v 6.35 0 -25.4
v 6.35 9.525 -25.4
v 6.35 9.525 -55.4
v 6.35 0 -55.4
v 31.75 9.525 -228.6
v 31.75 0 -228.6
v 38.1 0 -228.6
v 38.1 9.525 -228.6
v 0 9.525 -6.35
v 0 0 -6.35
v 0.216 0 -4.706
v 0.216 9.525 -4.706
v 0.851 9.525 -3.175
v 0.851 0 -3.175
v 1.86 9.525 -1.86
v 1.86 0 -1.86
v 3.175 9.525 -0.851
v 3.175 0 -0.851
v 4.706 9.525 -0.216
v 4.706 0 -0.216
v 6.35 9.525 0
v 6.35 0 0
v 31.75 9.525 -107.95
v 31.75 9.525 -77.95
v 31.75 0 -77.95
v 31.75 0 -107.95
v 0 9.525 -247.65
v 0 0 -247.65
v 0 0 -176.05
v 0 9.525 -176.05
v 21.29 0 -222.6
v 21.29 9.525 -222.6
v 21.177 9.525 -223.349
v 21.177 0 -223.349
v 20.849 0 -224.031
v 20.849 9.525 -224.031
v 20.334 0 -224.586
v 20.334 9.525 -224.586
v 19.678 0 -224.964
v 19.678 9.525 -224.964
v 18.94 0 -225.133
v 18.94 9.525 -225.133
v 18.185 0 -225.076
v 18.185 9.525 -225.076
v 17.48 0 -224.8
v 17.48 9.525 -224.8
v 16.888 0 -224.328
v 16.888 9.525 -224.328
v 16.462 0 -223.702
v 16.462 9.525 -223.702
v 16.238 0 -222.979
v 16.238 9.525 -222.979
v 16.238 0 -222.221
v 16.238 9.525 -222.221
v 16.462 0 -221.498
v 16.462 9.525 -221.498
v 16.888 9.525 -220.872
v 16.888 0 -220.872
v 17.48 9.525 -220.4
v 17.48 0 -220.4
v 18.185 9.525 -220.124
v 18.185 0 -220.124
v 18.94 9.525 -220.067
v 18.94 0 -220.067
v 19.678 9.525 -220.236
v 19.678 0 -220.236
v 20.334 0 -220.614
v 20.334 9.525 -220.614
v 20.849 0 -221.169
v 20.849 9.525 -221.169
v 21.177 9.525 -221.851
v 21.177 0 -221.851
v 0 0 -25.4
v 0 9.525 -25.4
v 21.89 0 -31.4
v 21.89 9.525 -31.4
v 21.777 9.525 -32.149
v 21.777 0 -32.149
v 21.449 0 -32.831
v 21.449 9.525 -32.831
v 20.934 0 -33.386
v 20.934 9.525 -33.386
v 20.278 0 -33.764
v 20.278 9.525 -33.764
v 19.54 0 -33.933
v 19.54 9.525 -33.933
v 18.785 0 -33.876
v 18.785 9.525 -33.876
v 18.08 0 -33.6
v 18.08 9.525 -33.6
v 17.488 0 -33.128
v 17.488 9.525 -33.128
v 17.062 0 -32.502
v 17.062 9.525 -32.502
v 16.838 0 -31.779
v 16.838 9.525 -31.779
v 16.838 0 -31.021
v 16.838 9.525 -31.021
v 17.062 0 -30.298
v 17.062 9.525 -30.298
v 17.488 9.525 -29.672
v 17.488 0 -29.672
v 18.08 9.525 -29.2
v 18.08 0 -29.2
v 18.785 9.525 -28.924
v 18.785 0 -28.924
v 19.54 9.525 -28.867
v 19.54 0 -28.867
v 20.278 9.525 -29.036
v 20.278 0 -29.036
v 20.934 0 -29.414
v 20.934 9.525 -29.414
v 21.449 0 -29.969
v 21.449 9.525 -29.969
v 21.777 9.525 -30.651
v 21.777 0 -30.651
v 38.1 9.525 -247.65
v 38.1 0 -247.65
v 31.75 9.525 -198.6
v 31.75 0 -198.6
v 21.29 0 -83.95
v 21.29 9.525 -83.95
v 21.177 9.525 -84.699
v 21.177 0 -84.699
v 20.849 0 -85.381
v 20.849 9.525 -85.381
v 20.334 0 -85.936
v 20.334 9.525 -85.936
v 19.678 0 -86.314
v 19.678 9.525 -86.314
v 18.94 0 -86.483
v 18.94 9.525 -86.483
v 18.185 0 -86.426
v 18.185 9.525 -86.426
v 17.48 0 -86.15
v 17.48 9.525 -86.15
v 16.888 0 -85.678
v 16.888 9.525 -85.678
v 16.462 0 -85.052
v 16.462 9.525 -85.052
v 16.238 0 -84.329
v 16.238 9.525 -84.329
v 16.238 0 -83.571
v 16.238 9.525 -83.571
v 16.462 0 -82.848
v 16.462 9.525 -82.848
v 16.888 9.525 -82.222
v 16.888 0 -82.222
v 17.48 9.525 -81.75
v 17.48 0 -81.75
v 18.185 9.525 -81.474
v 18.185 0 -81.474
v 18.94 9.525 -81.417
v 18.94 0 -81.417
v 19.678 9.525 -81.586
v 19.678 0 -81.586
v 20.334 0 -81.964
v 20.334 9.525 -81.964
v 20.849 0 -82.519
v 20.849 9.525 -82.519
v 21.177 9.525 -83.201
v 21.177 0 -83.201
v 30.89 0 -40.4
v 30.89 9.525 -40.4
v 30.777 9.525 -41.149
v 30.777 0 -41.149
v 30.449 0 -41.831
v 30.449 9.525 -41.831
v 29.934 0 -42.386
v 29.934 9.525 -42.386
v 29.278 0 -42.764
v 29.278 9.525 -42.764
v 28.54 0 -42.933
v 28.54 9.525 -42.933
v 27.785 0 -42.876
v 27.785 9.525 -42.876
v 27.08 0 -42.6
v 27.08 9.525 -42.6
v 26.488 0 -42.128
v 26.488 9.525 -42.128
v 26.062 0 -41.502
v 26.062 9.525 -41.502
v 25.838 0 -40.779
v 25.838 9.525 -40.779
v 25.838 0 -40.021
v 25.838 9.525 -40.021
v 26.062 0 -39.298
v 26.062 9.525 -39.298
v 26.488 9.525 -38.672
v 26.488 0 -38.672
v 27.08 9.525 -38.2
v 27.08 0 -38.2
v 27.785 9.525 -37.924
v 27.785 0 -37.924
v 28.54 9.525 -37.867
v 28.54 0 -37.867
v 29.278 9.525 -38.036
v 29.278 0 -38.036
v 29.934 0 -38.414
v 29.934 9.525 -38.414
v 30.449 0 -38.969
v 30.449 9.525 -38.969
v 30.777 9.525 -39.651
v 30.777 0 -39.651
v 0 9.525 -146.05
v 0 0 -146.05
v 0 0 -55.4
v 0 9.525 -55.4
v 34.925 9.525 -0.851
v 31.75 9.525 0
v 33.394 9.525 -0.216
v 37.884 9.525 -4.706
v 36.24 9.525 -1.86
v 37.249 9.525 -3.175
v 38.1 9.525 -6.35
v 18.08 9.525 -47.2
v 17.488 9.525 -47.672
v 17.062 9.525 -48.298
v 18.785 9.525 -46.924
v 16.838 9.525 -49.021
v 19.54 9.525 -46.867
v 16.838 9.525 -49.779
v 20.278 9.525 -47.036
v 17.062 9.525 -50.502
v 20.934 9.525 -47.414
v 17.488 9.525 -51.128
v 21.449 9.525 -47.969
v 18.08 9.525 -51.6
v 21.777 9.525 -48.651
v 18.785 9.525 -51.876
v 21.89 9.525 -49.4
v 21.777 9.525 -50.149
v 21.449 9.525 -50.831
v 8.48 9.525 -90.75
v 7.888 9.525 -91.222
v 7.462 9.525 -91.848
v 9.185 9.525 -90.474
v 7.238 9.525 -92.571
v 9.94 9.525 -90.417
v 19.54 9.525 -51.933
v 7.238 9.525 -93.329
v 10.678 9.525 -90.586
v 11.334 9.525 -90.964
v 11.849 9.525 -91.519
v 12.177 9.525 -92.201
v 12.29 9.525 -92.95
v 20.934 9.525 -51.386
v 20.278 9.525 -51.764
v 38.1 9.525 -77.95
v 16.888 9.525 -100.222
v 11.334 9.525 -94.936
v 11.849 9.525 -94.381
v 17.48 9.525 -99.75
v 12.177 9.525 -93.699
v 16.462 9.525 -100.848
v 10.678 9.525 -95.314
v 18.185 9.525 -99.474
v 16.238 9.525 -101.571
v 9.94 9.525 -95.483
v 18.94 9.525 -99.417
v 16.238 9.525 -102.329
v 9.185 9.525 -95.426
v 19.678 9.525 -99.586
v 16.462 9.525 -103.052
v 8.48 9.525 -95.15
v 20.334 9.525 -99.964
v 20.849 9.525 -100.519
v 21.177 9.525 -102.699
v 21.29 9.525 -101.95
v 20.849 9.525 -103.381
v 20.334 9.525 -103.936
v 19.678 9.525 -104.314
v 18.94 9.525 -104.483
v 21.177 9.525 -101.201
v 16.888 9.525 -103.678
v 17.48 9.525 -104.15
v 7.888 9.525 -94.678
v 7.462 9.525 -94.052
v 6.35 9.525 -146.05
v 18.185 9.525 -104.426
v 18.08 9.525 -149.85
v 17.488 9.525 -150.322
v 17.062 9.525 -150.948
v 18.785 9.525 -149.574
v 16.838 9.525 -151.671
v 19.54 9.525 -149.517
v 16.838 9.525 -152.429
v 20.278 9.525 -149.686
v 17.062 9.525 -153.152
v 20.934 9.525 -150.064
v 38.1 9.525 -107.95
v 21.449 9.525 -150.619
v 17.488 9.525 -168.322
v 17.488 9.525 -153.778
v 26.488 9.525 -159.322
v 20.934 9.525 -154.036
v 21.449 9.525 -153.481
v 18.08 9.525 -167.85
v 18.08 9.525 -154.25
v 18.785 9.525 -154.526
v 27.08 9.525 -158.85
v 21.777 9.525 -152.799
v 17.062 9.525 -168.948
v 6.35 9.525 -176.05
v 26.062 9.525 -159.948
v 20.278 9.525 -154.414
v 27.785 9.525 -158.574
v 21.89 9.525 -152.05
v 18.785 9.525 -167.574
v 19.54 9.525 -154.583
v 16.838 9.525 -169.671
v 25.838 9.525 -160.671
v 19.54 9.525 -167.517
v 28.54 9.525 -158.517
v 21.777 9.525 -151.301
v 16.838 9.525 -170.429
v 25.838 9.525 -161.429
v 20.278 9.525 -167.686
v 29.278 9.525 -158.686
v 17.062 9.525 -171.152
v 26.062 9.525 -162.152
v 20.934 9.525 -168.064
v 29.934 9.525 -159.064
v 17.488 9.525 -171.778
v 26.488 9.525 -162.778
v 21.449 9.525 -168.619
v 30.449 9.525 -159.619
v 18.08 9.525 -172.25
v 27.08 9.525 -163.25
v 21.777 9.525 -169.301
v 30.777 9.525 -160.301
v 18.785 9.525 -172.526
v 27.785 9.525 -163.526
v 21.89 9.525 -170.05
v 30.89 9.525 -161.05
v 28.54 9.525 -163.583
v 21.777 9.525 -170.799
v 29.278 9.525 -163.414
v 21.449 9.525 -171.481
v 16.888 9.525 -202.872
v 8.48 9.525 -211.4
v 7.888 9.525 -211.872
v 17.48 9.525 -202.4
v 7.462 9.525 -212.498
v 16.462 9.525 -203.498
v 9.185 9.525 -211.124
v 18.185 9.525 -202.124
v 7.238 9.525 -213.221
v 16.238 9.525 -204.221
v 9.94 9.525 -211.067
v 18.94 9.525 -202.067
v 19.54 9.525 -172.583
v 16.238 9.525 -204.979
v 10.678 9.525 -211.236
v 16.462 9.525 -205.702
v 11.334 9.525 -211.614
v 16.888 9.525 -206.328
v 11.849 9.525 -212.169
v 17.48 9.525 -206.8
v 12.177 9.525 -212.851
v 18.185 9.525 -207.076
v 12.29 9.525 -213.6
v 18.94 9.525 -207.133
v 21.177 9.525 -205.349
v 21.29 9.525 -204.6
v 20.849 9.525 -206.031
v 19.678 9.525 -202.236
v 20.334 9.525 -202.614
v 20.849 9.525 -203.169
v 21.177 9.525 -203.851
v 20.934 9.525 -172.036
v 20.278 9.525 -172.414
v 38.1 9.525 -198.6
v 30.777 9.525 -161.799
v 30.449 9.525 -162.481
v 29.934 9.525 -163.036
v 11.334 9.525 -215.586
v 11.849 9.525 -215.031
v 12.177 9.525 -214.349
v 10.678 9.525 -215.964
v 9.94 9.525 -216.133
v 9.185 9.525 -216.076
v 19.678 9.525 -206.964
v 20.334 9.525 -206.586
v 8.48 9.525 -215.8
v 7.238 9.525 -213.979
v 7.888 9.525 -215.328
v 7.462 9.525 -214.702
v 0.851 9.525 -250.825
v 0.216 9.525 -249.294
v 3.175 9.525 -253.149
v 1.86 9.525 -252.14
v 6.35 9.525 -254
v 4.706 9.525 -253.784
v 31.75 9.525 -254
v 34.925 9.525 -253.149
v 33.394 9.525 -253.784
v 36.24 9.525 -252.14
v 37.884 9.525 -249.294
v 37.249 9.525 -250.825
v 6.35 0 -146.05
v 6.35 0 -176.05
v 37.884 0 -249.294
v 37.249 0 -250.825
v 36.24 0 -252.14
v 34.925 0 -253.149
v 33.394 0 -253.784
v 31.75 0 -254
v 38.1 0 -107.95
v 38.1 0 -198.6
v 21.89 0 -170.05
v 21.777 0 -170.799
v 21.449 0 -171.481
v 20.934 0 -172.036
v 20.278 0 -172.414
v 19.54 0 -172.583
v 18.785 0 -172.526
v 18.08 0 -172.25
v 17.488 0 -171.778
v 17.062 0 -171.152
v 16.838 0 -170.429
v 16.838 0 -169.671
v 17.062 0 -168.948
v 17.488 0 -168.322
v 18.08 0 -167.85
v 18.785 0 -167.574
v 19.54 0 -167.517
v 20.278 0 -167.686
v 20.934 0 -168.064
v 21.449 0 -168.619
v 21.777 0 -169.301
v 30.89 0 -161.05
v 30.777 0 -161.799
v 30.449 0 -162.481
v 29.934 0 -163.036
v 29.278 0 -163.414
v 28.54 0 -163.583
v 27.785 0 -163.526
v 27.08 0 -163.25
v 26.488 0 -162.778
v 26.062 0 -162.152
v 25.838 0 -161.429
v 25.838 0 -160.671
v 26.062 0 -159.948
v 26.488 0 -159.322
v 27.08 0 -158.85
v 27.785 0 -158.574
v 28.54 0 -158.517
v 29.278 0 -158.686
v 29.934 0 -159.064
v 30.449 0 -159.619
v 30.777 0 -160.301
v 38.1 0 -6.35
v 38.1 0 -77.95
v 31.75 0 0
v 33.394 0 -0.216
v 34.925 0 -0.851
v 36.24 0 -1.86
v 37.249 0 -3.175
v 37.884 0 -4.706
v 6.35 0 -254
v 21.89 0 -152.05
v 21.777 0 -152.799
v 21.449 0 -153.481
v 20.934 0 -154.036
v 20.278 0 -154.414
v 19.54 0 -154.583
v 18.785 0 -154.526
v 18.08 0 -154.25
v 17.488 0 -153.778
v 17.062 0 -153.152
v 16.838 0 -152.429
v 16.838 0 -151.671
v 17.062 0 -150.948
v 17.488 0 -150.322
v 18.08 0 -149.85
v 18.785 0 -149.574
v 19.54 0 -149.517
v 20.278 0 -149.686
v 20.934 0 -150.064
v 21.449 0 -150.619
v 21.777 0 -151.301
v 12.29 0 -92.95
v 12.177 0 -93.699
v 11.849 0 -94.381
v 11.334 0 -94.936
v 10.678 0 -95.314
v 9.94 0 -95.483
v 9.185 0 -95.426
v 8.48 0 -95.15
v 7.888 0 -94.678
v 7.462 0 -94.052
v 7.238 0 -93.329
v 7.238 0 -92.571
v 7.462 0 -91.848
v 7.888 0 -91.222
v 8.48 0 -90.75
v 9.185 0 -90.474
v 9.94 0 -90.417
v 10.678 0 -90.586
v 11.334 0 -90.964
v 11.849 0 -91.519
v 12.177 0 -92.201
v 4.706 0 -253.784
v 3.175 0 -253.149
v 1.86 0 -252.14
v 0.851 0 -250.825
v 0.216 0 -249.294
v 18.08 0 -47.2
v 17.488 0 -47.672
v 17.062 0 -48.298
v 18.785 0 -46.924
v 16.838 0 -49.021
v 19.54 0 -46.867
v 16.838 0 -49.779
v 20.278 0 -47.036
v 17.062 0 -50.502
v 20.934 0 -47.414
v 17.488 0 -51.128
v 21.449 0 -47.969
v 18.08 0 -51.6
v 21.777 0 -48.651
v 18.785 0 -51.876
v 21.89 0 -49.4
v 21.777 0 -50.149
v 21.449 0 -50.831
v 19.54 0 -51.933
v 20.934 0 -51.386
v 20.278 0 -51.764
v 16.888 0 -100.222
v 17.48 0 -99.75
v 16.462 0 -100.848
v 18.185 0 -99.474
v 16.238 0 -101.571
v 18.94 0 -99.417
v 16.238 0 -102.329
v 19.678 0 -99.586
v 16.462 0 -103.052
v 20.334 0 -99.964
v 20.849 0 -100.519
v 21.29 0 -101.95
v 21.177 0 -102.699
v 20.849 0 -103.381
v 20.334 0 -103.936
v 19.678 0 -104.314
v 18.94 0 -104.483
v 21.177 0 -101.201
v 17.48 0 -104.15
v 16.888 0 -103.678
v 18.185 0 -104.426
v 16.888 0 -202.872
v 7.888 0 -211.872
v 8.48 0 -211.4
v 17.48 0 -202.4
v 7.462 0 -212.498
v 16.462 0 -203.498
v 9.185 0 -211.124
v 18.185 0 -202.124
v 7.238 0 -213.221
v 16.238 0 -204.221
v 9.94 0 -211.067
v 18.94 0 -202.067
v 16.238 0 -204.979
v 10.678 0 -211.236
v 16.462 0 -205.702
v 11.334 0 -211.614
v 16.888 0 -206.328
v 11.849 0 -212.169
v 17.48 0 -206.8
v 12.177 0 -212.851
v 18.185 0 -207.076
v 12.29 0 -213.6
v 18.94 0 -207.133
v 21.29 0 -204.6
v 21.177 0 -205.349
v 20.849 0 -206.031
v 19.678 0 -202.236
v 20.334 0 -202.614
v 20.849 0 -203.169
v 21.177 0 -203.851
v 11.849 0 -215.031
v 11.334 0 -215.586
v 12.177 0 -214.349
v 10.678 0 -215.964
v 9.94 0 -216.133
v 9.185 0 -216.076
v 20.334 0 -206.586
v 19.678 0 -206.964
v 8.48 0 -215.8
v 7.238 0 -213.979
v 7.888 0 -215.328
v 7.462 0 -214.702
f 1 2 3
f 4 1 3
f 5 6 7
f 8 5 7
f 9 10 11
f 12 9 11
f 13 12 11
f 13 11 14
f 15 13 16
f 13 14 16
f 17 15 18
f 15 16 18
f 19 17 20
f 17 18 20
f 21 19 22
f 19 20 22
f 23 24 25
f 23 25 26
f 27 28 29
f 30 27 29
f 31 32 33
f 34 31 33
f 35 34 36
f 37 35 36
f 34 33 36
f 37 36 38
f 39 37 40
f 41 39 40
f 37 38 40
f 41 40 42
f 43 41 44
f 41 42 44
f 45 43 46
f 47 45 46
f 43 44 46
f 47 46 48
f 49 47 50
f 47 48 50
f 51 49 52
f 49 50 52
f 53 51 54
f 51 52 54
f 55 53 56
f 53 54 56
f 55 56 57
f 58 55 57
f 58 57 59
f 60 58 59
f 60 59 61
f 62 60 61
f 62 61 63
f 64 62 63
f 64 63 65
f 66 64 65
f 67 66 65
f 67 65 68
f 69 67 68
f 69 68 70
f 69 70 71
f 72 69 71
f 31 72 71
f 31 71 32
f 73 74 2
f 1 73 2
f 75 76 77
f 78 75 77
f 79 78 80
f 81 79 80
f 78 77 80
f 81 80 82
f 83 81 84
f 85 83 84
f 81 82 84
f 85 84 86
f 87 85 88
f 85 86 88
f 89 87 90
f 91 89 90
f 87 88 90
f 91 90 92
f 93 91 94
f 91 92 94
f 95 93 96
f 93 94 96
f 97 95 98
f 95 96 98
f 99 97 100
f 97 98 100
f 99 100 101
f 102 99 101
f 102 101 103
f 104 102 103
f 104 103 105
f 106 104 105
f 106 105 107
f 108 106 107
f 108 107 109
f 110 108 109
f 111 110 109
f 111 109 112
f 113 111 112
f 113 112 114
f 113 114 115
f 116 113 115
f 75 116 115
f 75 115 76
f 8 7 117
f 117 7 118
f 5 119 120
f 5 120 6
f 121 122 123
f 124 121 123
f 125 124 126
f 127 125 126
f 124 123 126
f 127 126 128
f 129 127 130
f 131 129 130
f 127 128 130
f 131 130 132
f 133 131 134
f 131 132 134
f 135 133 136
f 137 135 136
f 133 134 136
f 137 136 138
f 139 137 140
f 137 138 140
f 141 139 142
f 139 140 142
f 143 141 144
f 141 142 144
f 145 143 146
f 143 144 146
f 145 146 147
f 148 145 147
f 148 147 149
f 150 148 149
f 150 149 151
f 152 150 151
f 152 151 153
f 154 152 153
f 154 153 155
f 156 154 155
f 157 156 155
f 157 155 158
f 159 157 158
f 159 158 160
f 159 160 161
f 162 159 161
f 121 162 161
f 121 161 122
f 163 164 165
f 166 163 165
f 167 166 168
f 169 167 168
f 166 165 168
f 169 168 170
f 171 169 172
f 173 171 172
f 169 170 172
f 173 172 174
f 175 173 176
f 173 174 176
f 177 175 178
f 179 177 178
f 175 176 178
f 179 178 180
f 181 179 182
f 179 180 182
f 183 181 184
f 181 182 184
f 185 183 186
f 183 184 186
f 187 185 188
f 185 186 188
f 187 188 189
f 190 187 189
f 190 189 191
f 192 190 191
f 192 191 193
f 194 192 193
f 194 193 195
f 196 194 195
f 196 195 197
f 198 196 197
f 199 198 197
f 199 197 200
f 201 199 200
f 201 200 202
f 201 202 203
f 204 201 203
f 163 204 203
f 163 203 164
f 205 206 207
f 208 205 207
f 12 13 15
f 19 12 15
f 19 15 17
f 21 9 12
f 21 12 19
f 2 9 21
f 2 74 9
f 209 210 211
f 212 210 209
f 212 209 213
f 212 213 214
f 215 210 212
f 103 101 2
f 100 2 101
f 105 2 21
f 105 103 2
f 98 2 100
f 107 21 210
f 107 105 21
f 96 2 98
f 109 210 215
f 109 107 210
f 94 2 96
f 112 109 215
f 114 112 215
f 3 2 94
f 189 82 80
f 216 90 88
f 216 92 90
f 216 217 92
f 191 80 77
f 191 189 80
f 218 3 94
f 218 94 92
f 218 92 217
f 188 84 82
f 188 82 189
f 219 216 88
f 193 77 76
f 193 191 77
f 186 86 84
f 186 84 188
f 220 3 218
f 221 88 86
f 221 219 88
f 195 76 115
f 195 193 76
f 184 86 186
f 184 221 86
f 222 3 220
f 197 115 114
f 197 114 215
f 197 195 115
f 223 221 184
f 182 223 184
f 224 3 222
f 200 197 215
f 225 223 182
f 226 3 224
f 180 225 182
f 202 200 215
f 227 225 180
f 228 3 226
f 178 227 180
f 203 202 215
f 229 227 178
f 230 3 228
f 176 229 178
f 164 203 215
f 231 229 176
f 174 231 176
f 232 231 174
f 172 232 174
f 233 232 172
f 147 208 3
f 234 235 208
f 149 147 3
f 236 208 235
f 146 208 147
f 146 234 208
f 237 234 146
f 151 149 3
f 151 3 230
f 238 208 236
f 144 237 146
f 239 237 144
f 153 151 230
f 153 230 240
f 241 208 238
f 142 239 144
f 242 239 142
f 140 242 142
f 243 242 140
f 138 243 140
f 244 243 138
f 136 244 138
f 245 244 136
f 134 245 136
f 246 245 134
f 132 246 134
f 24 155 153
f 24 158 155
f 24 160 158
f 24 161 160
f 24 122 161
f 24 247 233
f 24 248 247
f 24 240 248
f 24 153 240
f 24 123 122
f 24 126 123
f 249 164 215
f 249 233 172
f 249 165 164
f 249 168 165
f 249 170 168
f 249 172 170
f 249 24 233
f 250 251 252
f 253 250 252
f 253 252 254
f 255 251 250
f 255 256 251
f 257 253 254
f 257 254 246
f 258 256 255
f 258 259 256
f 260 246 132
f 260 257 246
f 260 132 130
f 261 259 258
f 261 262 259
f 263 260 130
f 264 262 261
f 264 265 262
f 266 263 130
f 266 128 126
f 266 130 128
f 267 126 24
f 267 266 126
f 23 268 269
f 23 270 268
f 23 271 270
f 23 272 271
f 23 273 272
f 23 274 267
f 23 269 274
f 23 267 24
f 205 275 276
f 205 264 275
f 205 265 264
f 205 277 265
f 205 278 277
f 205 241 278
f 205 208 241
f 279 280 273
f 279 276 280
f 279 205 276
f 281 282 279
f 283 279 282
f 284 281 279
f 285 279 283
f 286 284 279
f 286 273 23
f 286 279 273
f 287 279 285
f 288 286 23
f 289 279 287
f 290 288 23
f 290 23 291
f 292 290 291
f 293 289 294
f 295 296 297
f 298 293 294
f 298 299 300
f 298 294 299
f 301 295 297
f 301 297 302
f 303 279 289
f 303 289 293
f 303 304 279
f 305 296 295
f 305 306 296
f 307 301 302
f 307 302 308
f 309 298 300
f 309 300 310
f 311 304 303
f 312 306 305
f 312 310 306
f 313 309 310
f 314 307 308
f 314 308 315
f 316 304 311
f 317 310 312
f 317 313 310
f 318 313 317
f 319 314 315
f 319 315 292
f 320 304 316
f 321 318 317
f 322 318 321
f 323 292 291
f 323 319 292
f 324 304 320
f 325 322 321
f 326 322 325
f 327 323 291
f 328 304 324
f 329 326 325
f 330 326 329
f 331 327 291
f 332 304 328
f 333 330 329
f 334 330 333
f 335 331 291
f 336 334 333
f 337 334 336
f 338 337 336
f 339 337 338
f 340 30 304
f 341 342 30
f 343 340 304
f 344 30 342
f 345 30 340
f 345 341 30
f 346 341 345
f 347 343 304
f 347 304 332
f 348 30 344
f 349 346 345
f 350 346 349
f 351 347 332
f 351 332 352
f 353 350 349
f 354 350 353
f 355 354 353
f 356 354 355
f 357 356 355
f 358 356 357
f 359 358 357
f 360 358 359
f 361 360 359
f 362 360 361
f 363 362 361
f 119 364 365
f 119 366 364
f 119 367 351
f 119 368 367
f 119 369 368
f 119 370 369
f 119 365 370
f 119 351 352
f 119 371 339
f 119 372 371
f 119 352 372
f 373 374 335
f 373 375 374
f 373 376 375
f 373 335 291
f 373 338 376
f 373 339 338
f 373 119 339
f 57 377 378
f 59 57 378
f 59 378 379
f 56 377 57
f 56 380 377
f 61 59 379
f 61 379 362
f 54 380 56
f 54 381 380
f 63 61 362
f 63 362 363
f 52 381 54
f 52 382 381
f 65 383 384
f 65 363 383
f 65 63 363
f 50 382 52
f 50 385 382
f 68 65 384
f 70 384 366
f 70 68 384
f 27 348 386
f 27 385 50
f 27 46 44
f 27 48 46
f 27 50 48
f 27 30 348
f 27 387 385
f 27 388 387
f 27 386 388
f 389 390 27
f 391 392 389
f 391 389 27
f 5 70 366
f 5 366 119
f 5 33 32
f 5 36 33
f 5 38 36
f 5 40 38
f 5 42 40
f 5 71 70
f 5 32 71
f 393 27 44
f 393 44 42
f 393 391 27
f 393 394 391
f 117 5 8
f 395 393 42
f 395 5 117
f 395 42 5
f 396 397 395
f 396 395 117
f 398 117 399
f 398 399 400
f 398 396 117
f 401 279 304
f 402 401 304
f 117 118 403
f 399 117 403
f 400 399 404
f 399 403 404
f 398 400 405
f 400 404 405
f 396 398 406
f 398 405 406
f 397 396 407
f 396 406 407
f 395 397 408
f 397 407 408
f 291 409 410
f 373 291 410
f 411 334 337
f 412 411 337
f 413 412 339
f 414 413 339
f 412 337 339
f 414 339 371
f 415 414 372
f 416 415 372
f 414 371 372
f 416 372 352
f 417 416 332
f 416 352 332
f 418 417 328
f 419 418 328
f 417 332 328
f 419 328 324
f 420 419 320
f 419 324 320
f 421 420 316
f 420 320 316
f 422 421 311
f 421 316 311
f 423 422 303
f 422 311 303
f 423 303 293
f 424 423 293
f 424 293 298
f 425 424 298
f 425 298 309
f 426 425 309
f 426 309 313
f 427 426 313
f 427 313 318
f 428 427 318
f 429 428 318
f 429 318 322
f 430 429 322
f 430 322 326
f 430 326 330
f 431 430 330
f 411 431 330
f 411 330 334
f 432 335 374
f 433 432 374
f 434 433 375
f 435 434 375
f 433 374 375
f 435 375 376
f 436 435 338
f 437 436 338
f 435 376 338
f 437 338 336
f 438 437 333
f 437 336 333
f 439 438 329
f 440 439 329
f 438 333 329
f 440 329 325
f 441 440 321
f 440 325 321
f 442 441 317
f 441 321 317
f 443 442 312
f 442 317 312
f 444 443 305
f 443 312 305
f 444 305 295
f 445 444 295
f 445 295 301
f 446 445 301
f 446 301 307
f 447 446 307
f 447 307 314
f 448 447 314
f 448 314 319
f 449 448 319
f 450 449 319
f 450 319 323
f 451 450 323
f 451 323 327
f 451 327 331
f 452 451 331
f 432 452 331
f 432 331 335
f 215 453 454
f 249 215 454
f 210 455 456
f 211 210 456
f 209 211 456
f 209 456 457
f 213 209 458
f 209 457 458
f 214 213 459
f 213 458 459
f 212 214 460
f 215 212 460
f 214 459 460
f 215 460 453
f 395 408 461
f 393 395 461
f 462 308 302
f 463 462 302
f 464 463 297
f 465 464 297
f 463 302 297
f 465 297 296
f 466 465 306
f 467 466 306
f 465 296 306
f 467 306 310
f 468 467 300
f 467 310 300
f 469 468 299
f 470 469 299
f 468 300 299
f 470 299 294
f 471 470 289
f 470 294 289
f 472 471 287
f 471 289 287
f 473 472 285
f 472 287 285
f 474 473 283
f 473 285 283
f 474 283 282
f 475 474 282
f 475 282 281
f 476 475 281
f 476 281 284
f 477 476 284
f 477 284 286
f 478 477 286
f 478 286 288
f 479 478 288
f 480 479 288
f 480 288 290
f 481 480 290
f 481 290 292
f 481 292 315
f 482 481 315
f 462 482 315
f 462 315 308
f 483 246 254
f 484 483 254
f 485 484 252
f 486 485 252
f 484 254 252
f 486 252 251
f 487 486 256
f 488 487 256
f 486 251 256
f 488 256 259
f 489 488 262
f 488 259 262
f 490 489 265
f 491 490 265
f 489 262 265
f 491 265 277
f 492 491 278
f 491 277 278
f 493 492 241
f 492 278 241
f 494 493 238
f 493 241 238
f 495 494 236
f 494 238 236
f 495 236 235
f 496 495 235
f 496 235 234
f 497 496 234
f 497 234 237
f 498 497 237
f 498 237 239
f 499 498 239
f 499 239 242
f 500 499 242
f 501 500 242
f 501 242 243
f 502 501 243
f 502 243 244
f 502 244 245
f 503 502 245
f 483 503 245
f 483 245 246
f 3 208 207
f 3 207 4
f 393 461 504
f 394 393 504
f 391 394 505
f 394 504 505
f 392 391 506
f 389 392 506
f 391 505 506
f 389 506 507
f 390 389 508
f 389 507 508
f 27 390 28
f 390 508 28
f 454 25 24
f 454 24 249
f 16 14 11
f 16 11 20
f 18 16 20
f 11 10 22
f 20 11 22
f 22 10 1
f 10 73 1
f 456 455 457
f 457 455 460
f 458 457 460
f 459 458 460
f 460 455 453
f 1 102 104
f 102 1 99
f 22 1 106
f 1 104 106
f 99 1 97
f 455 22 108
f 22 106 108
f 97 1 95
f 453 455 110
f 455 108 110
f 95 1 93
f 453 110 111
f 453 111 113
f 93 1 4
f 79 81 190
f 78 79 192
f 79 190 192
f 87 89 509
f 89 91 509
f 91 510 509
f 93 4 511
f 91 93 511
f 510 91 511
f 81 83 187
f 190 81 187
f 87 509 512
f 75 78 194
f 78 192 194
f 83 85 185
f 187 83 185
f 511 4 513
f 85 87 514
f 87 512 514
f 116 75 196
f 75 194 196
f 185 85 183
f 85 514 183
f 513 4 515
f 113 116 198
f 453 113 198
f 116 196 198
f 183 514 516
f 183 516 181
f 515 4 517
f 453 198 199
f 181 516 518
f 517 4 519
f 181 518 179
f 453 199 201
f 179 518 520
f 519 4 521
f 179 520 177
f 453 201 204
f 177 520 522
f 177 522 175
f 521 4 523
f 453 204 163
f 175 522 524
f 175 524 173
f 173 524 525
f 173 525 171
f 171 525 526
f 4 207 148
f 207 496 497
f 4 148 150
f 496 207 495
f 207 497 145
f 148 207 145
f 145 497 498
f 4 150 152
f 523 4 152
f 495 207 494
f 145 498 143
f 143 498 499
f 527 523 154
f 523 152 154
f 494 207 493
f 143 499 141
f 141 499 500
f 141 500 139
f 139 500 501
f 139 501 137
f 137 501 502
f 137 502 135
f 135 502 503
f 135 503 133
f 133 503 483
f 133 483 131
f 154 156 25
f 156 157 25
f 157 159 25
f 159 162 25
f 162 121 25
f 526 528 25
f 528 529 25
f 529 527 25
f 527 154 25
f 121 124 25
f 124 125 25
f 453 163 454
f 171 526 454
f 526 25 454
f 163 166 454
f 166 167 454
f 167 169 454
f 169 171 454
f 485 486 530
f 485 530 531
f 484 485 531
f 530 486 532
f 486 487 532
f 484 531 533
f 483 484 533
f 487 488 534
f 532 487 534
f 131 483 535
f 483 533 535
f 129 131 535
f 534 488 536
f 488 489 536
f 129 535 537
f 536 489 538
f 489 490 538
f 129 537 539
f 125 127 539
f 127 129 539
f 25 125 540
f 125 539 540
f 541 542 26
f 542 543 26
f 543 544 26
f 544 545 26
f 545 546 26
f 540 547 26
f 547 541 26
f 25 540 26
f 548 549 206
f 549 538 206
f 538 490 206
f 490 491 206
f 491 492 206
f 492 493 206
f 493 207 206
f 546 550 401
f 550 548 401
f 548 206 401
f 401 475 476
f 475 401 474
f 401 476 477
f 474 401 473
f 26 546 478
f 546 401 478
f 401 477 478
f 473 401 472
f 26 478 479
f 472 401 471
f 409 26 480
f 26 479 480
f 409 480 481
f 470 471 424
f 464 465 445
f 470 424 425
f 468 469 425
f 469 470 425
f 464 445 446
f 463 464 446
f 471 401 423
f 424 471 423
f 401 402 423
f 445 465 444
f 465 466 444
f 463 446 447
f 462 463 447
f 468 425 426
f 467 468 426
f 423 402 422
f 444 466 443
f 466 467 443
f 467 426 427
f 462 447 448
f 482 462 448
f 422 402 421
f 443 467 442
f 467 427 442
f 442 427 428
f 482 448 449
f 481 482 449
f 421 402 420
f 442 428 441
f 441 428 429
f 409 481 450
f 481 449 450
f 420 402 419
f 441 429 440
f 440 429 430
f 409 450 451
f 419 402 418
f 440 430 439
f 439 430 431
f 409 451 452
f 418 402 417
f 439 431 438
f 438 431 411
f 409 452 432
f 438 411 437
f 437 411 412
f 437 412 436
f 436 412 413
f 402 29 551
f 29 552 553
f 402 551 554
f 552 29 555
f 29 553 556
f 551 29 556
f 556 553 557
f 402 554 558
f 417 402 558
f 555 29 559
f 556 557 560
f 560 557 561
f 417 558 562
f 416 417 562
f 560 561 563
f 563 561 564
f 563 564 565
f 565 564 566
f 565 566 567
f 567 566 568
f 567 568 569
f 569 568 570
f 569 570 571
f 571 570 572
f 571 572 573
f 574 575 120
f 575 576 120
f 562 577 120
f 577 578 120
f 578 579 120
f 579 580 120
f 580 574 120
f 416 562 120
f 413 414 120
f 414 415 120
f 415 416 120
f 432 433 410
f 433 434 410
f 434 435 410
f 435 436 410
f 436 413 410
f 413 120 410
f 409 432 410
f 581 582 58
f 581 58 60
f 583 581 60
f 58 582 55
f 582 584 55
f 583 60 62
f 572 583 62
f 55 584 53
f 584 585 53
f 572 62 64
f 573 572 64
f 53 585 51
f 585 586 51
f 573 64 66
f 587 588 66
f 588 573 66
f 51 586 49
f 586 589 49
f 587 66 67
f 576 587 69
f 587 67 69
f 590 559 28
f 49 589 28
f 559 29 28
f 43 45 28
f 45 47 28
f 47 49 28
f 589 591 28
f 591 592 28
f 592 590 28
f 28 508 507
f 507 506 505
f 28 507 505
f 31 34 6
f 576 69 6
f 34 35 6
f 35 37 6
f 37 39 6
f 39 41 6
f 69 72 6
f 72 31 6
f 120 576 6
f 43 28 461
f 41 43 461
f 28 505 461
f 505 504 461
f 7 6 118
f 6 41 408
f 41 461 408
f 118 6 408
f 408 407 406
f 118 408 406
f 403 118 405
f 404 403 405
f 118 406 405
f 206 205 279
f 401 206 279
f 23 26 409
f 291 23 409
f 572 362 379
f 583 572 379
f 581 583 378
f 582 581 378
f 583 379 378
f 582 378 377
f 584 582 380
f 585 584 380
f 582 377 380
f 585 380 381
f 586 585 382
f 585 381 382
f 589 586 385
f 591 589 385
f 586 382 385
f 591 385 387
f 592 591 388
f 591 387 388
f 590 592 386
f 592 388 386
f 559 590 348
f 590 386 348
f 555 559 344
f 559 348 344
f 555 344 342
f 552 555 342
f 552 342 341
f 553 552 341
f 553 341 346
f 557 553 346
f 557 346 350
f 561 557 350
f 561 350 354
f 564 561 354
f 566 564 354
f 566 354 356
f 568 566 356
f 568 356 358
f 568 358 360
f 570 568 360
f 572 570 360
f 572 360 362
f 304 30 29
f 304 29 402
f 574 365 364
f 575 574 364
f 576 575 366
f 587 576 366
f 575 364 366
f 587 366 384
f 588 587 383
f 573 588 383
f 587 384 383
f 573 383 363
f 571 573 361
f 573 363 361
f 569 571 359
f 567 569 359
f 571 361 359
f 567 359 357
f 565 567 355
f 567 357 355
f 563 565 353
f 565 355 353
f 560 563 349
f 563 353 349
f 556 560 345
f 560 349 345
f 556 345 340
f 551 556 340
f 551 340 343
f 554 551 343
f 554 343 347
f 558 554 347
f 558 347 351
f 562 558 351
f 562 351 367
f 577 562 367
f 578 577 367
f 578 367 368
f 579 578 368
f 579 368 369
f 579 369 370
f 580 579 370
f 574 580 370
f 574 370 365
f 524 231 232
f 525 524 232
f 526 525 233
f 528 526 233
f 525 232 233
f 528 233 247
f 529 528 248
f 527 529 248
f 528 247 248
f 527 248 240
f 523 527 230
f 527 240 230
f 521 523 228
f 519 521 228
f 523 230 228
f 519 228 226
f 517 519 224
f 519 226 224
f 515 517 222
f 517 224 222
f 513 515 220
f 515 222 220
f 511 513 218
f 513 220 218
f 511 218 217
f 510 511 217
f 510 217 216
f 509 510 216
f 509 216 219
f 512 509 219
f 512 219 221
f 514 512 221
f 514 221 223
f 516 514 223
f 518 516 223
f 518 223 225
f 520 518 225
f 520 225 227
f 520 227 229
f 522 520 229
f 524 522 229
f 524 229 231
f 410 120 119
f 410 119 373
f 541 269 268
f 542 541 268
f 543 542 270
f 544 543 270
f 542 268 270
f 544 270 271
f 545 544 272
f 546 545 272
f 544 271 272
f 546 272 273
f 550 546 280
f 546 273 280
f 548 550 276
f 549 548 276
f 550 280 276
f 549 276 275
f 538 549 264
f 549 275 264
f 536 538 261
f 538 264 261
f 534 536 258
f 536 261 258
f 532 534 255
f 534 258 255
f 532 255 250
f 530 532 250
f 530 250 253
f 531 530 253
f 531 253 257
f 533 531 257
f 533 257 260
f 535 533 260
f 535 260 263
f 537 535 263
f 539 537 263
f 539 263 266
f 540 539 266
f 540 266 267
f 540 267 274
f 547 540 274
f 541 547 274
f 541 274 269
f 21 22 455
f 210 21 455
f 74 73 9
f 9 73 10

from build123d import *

# Parameters (mm, degrees)
BOSS_EXTRUDE1_DEPTH = 9.525
CUT_EXTRUDE1_REACH  = 11.525
SKETCH2_R           = 2.54
SKETCH2_W           = 6.35
SKETCH2_H           = 30


with BuildPart() as part:
    # Sketch1 → Boss-Extrude1 (new body)
    with BuildSketch(Plane(origin=(0, 0, 0), x_dir=(1, 0, 0), z_dir=(0, 1, 0))):
        with BuildLine():
            Line((6.35, 0), (31.75, 0))
            ThreePointArc((31.75, 0), (36.240128061, 1.859871939), (38.1, 6.35))
            Line((38.1, 6.35), (38.1, 247.65))
            ThreePointArc((38.1, 247.65), (36.240128061, 252.140128061), (31.75, 254))
            Line((31.75, 254), (6.35, 254))
            ThreePointArc((6.35, 254), (1.859871939, 252.140128061), (0, 247.65))
            Line((0, 247.65), (0, 6.35))
            ThreePointArc((0, 6.35), (1.859871939, 1.859871939), (6.35, 0))
        make_face()
    extrude(amount=BOSS_EXTRUDE1_DEPTH)

    # Sketch2 → Cut-Extrude1 (cut, up to next)
    with BuildSketch(Plane(origin=(0, 9.525, 0), x_dir=(1, 0, 0), z_dir=(0, 1, 0)), mode=Mode.PRIVATE) as cut_extrude1_sk1:
        with Locations((28.34999918, 40.4)):
            Circle(SKETCH2_R)
    cut_extrude1_tool1 = extrude(cut_extrude1_sk1.sketch, amount=-CUT_EXTRUDE1_REACH, mode=Mode.PRIVATE) & part.part
    add(cut_extrude1_tool1.solids().sort_by_distance((28.349999, 9.525, -40.4))[0], mode=Mode.SUBTRACT)
    # Sketch2 → Cut-Extrude1 (cut, up to next)
    with BuildSketch(Plane(origin=(0, 9.525, 0), x_dir=(1, 0, 0), z_dir=(0, 1, 0)), mode=Mode.PRIVATE) as cut_extrude1_sk2:
        with Locations((19.3499994, 49.39999978)):
            Circle(SKETCH2_R)
    cut_extrude1_tool2 = extrude(cut_extrude1_sk2.sketch, amount=-CUT_EXTRUDE1_REACH, mode=Mode.PRIVATE) & part.part
    add(cut_extrude1_tool2.solids().sort_by_distance((19.349999, 9.525, -49.4))[0], mode=Mode.SUBTRACT)
    # Sketch2 → Cut-Extrude1 (cut, up to next)
    with BuildSketch(Plane(origin=(0, 9.525, 0), x_dir=(1, 0, 0), z_dir=(0, 1, 0)), mode=Mode.PRIVATE) as cut_extrude1_sk3:
        with Locations((19.3499994, 31.40000022)):
            Circle(SKETCH2_R)
    cut_extrude1_tool3 = extrude(cut_extrude1_sk3.sketch, amount=-CUT_EXTRUDE1_REACH, mode=Mode.PRIVATE) & part.part
    add(cut_extrude1_tool3.solids().sort_by_distance((19.349999, 9.525, -31.4))[0], mode=Mode.SUBTRACT)
    # Sketch2 → Cut-Extrude1 (cut, up to next)
    with BuildSketch(Plane(origin=(0, 9.525, 0), x_dir=(1, 0, 0), z_dir=(0, 1, 0)), mode=Mode.PRIVATE) as cut_extrude1_sk4:
        with Locations((28.34999918, 161.05)):
            Circle(SKETCH2_R)
    cut_extrude1_tool4 = extrude(cut_extrude1_sk4.sketch, amount=-CUT_EXTRUDE1_REACH, mode=Mode.PRIVATE) & part.part
    add(cut_extrude1_tool4.solids().sort_by_distance((28.349999, 9.525, -161.05))[0], mode=Mode.SUBTRACT)
    # Sketch2 → Cut-Extrude1 (cut, up to next)
    with BuildSketch(Plane(origin=(0, 9.525, 0), x_dir=(1, 0, 0), z_dir=(0, 1, 0)), mode=Mode.PRIVATE) as cut_extrude1_sk5:
        with Locations((19.3499994, 170.04999978)):
            Circle(SKETCH2_R)
    cut_extrude1_tool5 = extrude(cut_extrude1_sk5.sketch, amount=-CUT_EXTRUDE1_REACH, mode=Mode.PRIVATE) & part.part
    add(cut_extrude1_tool5.solids().sort_by_distance((19.349999, 9.525, -170.05))[0], mode=Mode.SUBTRACT)
    # Sketch2 → Cut-Extrude1 (cut, up to next)
    with BuildSketch(Plane(origin=(0, 9.525, 0), x_dir=(1, 0, 0), z_dir=(0, 1, 0)), mode=Mode.PRIVATE) as cut_extrude1_sk6:
        with Locations((19.3499994, 152.05000022)):
            Circle(SKETCH2_R)
    cut_extrude1_tool6 = extrude(cut_extrude1_sk6.sketch, amount=-CUT_EXTRUDE1_REACH, mode=Mode.PRIVATE) & part.part
    add(cut_extrude1_tool6.solids().sort_by_distance((19.349999, 9.525, -152.05))[0], mode=Mode.SUBTRACT)
    # Sketch2 → Cut-Extrude1 (cut, up to next)
    with BuildSketch(Plane(origin=(0, 9.525, 0), x_dir=(1, 0, 0), z_dir=(0, 1, 0)), mode=Mode.PRIVATE) as cut_extrude1_sk7:
        with Locations((9.75000082, 213.6)):
            Circle(SKETCH2_R)
    cut_extrude1_tool7 = extrude(cut_extrude1_sk7.sketch, amount=-CUT_EXTRUDE1_REACH, mode=Mode.PRIVATE) & part.part
    add(cut_extrude1_tool7.solids().sort_by_distance((9.750001, 9.525, -213.6))[0], mode=Mode.SUBTRACT)
    # Sketch2 → Cut-Extrude1 (cut, up to next)
    with BuildSketch(Plane(origin=(0, 9.525, 0), x_dir=(1, 0, 0), z_dir=(0, 1, 0)), mode=Mode.PRIVATE) as cut_extrude1_sk8:
        with Locations((18.7500006, 222.59999978)):
            Circle(SKETCH2_R)
    cut_extrude1_tool8 = extrude(cut_extrude1_sk8.sketch, amount=-CUT_EXTRUDE1_REACH, mode=Mode.PRIVATE) & part.part
    add(cut_extrude1_tool8.solids().sort_by_distance((18.750001, 9.525, -222.6))[0], mode=Mode.SUBTRACT)
    # Sketch2 → Cut-Extrude1 (cut, up to next)
    with BuildSketch(Plane(origin=(0, 9.525, 0), x_dir=(1, 0, 0), z_dir=(0, 1, 0)), mode=Mode.PRIVATE) as cut_extrude1_sk9:
        with Locations((18.7500006, 204.60000022)):
            Circle(SKETCH2_R)
    cut_extrude1_tool9 = extrude(cut_extrude1_sk9.sketch, amount=-CUT_EXTRUDE1_REACH, mode=Mode.PRIVATE) & part.part
    add(cut_extrude1_tool9.solids().sort_by_distance((18.750001, 9.525, -204.6))[0], mode=Mode.SUBTRACT)
    # Sketch2 → Cut-Extrude1 (cut, up to next)
    with BuildSketch(Plane(origin=(0, 9.525, 0), x_dir=(1, 0, 0), z_dir=(0, 1, 0)), mode=Mode.PRIVATE) as cut_extrude1_sk10:
        with Locations((9.75000082, 92.95)):
            Circle(SKETCH2_R)
    cut_extrude1_tool10 = extrude(cut_extrude1_sk10.sketch, amount=-CUT_EXTRUDE1_REACH, mode=Mode.PRIVATE) & part.part
    add(cut_extrude1_tool10.solids().sort_by_distance((9.750001, 9.525, -92.95))[0], mode=Mode.SUBTRACT)
    # Sketch2 → Cut-Extrude1 (cut, up to next)
    with BuildSketch(Plane(origin=(0, 9.525, 0), x_dir=(1, 0, 0), z_dir=(0, 1, 0)), mode=Mode.PRIVATE) as cut_extrude1_sk11:
        with Locations((18.7500006, 101.94999978)):
            Circle(SKETCH2_R)
    cut_extrude1_tool11 = extrude(cut_extrude1_sk11.sketch, amount=-CUT_EXTRUDE1_REACH, mode=Mode.PRIVATE) & part.part
    add(cut_extrude1_tool11.solids().sort_by_distance((18.750001, 9.525, -101.95))[0], mode=Mode.SUBTRACT)
    # Sketch2 → Cut-Extrude1 (cut, up to next)
    with BuildSketch(Plane(origin=(0, 9.525, 0), x_dir=(1, 0, 0), z_dir=(0, 1, 0)), mode=Mode.PRIVATE) as cut_extrude1_sk12:
        with Locations((18.7500006, 83.95000022)):
            Circle(SKETCH2_R)
    cut_extrude1_tool12 = extrude(cut_extrude1_sk12.sketch, amount=-CUT_EXTRUDE1_REACH, mode=Mode.PRIVATE) & part.part
    add(cut_extrude1_tool12.solids().sort_by_distance((18.750001, 9.525, -83.95))[0], mode=Mode.SUBTRACT)
    # Sketch2 → Cut-Extrude1 (cut, up to next)
    with BuildSketch(Plane(origin=(0, 9.525, 0), x_dir=(1, 0, 0), z_dir=(0, 1, 0)), mode=Mode.PRIVATE) as cut_extrude1_sk13:
        with Locations((3.175, 40.4)):
            Rectangle(SKETCH2_W, SKETCH2_H)
    cut_extrude1_tool13 = extrude(cut_extrude1_sk13.sketch, amount=-CUT_EXTRUDE1_REACH, mode=Mode.PRIVATE) & part.part
    add(cut_extrude1_tool13.solids().sort_by_distance((3.175, 9.525, -40.4))[0], mode=Mode.SUBTRACT)
    # Sketch2 → Cut-Extrude1 (cut, up to next)
    with BuildSketch(Plane(origin=(0, 9.525, 0), x_dir=(1, 0, 0), z_dir=(0, 1, 0)), mode=Mode.PRIVATE) as cut_extrude1_sk14:
        with Locations((3.175, 161.05)):
            Rectangle(SKETCH2_W, SKETCH2_H)
    cut_extrude1_tool14 = extrude(cut_extrude1_sk14.sketch, amount=-CUT_EXTRUDE1_REACH, mode=Mode.PRIVATE) & part.part
    add(cut_extrude1_tool14.solids().sort_by_distance((3.175, 9.525, -161.05))[0], mode=Mode.SUBTRACT)
    # Sketch2 → Cut-Extrude1 (cut, up to next)
    with BuildSketch(Plane(origin=(0, 9.525, 0), x_dir=(1, 0, 0), z_dir=(0, 1, 0)), mode=Mode.PRIVATE) as cut_extrude1_sk15:
        with Locations((34.925, 213.6)):
            Rectangle(SKETCH2_W, SKETCH2_H)
    cut_extrude1_tool15 = extrude(cut_extrude1_sk15.sketch, amount=-CUT_EXTRUDE1_REACH, mode=Mode.PRIVATE) & part.part
    add(cut_extrude1_tool15.solids().sort_by_distance((34.925, 9.525, -213.6))[0], mode=Mode.SUBTRACT)
    # Sketch2 → Cut-Extrude1 (cut, up to next)
    with BuildSketch(Plane(origin=(0, 9.525, 0), x_dir=(1, 0, 0), z_dir=(0, 1, 0)), mode=Mode.PRIVATE) as cut_extrude1_sk16:
        with Locations((34.925, 92.95)):
            Rectangle(SKETCH2_W, SKETCH2_H)
    cut_extrude1_tool16 = extrude(cut_extrude1_sk16.sketch, amount=-CUT_EXTRUDE1_REACH, mode=Mode.PRIVATE) & part.part
    add(cut_extrude1_tool16.solids().sort_by_distance((34.925, 9.525, -92.95))[0], mode=Mode.SUBTRACT)


solid = part.part
